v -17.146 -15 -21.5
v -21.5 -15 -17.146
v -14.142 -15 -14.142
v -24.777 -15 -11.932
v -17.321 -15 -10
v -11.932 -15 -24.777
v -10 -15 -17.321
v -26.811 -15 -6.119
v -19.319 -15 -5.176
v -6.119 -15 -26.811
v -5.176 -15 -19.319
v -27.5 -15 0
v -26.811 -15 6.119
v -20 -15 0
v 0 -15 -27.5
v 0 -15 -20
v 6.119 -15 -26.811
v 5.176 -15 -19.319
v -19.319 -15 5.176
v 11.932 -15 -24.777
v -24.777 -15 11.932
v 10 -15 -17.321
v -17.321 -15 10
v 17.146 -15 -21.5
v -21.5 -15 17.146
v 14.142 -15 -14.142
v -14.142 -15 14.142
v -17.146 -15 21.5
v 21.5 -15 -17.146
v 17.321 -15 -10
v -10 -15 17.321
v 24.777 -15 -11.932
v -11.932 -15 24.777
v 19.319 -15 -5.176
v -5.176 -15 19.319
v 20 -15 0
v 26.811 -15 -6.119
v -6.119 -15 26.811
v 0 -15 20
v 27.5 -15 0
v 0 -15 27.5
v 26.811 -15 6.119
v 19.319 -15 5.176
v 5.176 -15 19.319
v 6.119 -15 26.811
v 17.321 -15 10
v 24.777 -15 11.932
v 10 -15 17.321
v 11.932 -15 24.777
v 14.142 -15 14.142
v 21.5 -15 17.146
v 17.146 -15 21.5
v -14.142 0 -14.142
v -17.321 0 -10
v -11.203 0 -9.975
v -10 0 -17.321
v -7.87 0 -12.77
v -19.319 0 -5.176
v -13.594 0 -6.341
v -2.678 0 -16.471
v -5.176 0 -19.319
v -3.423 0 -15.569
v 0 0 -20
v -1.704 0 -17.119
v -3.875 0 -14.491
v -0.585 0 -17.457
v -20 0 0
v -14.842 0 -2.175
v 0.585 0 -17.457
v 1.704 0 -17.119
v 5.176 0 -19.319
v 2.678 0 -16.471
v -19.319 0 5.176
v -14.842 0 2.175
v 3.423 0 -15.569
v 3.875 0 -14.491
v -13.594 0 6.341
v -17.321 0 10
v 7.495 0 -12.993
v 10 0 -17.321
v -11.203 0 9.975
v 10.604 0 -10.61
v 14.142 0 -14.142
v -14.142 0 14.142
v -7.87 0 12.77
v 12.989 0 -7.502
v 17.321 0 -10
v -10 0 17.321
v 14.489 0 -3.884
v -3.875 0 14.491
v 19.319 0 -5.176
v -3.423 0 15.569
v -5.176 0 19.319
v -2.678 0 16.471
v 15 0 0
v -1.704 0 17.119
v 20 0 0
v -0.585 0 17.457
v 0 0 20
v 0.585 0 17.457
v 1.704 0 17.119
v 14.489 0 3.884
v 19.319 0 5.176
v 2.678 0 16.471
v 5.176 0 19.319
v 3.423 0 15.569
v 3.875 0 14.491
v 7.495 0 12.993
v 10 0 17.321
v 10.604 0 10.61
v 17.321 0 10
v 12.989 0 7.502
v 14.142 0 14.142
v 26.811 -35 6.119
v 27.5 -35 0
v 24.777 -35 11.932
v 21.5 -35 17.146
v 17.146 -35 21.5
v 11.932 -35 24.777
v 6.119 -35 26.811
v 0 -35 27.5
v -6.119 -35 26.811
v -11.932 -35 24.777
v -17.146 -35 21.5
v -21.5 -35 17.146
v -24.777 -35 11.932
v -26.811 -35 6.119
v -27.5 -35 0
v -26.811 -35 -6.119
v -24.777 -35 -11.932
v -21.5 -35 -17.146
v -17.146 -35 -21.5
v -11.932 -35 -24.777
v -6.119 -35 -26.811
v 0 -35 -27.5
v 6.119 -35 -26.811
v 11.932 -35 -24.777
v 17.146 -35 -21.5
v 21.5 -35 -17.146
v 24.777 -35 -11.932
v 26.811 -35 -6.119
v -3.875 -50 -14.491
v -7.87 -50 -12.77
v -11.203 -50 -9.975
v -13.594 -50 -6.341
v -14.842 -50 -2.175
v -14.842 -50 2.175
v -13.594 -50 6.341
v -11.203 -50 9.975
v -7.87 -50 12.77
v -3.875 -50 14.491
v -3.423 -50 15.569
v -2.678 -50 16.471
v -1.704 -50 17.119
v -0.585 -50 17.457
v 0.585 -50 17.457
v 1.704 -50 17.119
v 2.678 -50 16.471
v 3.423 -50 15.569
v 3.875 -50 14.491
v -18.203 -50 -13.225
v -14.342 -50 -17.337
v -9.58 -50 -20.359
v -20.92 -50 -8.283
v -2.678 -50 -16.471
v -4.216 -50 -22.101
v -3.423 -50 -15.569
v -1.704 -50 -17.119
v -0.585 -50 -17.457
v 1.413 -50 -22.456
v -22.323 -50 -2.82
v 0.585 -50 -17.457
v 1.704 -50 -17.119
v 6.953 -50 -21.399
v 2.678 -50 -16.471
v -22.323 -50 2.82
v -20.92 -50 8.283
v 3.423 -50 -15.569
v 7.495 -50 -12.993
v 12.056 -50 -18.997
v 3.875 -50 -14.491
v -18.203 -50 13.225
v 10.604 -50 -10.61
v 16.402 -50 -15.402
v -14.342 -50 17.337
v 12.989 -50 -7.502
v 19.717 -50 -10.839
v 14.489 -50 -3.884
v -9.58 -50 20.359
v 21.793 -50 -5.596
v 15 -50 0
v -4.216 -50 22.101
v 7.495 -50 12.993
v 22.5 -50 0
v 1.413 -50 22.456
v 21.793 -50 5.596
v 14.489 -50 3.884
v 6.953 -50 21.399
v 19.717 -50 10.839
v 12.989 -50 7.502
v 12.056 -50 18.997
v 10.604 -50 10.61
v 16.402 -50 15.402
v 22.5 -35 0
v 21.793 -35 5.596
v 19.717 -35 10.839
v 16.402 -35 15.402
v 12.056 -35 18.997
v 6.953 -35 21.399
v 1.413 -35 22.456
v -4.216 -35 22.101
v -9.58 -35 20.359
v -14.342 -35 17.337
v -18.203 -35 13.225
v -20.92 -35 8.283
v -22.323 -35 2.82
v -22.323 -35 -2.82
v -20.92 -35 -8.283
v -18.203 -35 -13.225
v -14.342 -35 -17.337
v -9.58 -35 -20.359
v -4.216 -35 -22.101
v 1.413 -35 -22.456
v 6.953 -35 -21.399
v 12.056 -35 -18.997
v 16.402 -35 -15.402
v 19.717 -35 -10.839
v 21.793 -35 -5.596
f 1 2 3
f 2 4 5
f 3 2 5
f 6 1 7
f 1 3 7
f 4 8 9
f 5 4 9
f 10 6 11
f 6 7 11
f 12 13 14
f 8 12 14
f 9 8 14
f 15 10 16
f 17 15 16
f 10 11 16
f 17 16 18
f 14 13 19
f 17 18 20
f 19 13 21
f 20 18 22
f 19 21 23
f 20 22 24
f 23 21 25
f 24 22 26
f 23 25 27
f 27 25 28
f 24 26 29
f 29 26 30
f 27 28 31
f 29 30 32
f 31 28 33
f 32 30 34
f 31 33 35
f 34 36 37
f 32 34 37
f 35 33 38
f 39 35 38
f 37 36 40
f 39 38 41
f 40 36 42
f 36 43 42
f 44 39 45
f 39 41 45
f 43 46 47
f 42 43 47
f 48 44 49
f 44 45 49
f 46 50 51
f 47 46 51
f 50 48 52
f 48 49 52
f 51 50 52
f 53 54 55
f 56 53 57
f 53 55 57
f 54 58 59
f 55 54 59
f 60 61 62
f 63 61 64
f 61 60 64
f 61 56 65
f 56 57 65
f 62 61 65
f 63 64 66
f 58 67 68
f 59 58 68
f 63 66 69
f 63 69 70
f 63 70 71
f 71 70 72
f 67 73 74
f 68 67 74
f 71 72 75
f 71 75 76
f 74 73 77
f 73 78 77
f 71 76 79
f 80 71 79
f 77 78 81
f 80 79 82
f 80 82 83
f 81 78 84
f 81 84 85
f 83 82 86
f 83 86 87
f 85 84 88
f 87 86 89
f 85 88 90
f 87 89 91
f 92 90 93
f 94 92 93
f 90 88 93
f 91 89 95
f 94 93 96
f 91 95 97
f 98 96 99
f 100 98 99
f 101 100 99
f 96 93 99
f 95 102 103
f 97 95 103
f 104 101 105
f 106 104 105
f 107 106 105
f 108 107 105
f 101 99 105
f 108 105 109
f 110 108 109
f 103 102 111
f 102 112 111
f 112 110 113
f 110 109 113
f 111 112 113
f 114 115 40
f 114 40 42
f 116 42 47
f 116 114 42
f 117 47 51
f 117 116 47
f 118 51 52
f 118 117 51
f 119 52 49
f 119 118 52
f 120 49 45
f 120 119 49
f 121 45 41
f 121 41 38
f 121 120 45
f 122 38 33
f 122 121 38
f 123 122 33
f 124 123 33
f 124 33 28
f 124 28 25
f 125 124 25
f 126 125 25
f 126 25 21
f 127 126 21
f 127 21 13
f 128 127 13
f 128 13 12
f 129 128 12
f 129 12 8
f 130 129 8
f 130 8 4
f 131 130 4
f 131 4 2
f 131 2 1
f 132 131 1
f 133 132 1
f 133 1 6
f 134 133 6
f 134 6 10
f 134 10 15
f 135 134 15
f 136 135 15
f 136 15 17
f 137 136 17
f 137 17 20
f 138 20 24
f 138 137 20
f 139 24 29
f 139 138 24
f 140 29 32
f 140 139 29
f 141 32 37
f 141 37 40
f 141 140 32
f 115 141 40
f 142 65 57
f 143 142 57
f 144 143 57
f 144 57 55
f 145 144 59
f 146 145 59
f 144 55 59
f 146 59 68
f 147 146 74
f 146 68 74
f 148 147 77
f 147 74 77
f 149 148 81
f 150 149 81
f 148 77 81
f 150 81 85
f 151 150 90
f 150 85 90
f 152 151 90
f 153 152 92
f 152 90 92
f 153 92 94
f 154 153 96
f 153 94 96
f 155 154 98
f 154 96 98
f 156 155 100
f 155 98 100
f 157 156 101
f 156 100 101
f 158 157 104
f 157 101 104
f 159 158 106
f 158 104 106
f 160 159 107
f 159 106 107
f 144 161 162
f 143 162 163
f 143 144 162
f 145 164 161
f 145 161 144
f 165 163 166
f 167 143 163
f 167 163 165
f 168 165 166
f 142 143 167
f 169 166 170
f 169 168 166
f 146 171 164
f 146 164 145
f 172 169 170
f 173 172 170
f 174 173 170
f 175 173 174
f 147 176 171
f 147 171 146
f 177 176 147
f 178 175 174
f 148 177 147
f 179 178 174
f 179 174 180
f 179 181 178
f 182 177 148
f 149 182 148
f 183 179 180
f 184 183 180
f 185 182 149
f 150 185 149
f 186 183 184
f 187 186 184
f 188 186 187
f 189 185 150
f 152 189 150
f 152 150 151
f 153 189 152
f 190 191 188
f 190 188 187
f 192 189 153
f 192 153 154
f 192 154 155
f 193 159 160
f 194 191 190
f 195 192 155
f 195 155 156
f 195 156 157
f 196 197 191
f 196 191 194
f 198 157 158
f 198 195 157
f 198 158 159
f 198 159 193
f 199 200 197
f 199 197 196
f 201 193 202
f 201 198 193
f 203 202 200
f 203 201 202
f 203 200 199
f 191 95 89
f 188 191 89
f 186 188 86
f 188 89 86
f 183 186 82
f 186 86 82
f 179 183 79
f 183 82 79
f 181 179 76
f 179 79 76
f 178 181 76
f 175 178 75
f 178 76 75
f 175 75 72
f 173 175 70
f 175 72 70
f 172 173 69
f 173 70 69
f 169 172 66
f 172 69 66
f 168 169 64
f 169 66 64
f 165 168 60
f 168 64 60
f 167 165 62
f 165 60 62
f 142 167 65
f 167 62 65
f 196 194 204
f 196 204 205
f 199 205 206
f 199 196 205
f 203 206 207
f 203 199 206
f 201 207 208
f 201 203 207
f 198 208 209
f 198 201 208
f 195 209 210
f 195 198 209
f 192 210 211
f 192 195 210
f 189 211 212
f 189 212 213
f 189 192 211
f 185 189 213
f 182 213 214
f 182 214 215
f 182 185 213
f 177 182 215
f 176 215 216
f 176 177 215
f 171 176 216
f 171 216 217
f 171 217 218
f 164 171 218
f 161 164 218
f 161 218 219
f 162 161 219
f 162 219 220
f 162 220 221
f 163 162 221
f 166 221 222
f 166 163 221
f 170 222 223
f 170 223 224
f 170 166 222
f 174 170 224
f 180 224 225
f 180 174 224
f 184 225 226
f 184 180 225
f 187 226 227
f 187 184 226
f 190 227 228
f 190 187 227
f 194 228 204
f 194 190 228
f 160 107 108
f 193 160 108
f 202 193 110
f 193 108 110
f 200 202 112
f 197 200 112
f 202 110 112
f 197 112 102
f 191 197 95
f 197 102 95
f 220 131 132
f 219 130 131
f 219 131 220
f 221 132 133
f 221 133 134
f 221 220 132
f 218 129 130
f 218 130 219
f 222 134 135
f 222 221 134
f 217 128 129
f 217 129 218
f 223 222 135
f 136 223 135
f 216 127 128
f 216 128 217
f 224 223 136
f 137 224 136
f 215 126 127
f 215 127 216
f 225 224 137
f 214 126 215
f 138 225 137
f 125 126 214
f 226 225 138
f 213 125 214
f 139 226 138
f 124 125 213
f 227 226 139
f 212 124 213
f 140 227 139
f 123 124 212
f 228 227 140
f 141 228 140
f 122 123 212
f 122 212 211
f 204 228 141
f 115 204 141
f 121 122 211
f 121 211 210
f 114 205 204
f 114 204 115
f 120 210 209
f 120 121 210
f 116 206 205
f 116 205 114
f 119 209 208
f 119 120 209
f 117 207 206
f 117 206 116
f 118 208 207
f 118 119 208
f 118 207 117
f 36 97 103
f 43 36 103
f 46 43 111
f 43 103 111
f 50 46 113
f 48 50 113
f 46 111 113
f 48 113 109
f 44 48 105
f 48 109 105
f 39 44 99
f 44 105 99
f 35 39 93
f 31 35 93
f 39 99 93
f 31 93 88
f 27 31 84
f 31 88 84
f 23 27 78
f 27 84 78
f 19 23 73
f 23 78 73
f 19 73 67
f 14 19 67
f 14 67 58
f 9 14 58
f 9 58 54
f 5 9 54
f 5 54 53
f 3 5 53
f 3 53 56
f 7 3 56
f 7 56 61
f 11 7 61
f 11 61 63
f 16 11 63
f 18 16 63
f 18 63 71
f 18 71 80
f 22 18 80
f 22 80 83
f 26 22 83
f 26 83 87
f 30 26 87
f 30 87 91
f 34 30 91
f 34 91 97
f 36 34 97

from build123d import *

# Parameters (mm, degrees)
F0_R     = 20
F1_DEPTH = 50
F2_R     = 27.5
F2_R_2   = 20
F3_DEPTH = 35
F4_R     = 29.753541
F4_R_2   = 22.5
F5_DEPTH = 15


with BuildPart() as f1:
    # F0 (on Front) → F1 (new body)
    with BuildSketch(Plane.XZ):
        Circle(F0_R)
        with BuildLine():
            ThreePointArc((3.875362, 14.490741), (11.898118, 9.134264), (15, 0))
            ThreePointArc((15, 0), (11.898118, -9.134264), (3.875362, -14.490741))
            ThreePointArc((3.875362, -14.490741), (0, -17.5), (-3.875362, -14.490741))
            ThreePointArc((-3.875362, -14.490741), (-15, 0), (-3.875362, 14.490741))
            ThreePointArc((-3.875362, 14.490741), (0, 17.5), (3.875362, 14.490741))
        make_face(mode=Mode.SUBTRACT)
    extrude(amount=F1_DEPTH)

    # F2 (on face) → F3 (join)
    with BuildSketch(Plane.XZ.offset(50)):
        Circle(F2_R)
        Circle(F2_R_2, mode=Mode.SUBTRACT)
    extrude(amount=-F3_DEPTH)

    # F4 (on face) → F5 (cut)
    with BuildSketch(Plane.XZ.offset(50)):
        Circle(F4_R)
        Circle(F4_R_2, mode=Mode.SUBTRACT)
    extrude(amount=-F5_DEPTH, mode=Mode.SUBTRACT)


solid = f1.part
